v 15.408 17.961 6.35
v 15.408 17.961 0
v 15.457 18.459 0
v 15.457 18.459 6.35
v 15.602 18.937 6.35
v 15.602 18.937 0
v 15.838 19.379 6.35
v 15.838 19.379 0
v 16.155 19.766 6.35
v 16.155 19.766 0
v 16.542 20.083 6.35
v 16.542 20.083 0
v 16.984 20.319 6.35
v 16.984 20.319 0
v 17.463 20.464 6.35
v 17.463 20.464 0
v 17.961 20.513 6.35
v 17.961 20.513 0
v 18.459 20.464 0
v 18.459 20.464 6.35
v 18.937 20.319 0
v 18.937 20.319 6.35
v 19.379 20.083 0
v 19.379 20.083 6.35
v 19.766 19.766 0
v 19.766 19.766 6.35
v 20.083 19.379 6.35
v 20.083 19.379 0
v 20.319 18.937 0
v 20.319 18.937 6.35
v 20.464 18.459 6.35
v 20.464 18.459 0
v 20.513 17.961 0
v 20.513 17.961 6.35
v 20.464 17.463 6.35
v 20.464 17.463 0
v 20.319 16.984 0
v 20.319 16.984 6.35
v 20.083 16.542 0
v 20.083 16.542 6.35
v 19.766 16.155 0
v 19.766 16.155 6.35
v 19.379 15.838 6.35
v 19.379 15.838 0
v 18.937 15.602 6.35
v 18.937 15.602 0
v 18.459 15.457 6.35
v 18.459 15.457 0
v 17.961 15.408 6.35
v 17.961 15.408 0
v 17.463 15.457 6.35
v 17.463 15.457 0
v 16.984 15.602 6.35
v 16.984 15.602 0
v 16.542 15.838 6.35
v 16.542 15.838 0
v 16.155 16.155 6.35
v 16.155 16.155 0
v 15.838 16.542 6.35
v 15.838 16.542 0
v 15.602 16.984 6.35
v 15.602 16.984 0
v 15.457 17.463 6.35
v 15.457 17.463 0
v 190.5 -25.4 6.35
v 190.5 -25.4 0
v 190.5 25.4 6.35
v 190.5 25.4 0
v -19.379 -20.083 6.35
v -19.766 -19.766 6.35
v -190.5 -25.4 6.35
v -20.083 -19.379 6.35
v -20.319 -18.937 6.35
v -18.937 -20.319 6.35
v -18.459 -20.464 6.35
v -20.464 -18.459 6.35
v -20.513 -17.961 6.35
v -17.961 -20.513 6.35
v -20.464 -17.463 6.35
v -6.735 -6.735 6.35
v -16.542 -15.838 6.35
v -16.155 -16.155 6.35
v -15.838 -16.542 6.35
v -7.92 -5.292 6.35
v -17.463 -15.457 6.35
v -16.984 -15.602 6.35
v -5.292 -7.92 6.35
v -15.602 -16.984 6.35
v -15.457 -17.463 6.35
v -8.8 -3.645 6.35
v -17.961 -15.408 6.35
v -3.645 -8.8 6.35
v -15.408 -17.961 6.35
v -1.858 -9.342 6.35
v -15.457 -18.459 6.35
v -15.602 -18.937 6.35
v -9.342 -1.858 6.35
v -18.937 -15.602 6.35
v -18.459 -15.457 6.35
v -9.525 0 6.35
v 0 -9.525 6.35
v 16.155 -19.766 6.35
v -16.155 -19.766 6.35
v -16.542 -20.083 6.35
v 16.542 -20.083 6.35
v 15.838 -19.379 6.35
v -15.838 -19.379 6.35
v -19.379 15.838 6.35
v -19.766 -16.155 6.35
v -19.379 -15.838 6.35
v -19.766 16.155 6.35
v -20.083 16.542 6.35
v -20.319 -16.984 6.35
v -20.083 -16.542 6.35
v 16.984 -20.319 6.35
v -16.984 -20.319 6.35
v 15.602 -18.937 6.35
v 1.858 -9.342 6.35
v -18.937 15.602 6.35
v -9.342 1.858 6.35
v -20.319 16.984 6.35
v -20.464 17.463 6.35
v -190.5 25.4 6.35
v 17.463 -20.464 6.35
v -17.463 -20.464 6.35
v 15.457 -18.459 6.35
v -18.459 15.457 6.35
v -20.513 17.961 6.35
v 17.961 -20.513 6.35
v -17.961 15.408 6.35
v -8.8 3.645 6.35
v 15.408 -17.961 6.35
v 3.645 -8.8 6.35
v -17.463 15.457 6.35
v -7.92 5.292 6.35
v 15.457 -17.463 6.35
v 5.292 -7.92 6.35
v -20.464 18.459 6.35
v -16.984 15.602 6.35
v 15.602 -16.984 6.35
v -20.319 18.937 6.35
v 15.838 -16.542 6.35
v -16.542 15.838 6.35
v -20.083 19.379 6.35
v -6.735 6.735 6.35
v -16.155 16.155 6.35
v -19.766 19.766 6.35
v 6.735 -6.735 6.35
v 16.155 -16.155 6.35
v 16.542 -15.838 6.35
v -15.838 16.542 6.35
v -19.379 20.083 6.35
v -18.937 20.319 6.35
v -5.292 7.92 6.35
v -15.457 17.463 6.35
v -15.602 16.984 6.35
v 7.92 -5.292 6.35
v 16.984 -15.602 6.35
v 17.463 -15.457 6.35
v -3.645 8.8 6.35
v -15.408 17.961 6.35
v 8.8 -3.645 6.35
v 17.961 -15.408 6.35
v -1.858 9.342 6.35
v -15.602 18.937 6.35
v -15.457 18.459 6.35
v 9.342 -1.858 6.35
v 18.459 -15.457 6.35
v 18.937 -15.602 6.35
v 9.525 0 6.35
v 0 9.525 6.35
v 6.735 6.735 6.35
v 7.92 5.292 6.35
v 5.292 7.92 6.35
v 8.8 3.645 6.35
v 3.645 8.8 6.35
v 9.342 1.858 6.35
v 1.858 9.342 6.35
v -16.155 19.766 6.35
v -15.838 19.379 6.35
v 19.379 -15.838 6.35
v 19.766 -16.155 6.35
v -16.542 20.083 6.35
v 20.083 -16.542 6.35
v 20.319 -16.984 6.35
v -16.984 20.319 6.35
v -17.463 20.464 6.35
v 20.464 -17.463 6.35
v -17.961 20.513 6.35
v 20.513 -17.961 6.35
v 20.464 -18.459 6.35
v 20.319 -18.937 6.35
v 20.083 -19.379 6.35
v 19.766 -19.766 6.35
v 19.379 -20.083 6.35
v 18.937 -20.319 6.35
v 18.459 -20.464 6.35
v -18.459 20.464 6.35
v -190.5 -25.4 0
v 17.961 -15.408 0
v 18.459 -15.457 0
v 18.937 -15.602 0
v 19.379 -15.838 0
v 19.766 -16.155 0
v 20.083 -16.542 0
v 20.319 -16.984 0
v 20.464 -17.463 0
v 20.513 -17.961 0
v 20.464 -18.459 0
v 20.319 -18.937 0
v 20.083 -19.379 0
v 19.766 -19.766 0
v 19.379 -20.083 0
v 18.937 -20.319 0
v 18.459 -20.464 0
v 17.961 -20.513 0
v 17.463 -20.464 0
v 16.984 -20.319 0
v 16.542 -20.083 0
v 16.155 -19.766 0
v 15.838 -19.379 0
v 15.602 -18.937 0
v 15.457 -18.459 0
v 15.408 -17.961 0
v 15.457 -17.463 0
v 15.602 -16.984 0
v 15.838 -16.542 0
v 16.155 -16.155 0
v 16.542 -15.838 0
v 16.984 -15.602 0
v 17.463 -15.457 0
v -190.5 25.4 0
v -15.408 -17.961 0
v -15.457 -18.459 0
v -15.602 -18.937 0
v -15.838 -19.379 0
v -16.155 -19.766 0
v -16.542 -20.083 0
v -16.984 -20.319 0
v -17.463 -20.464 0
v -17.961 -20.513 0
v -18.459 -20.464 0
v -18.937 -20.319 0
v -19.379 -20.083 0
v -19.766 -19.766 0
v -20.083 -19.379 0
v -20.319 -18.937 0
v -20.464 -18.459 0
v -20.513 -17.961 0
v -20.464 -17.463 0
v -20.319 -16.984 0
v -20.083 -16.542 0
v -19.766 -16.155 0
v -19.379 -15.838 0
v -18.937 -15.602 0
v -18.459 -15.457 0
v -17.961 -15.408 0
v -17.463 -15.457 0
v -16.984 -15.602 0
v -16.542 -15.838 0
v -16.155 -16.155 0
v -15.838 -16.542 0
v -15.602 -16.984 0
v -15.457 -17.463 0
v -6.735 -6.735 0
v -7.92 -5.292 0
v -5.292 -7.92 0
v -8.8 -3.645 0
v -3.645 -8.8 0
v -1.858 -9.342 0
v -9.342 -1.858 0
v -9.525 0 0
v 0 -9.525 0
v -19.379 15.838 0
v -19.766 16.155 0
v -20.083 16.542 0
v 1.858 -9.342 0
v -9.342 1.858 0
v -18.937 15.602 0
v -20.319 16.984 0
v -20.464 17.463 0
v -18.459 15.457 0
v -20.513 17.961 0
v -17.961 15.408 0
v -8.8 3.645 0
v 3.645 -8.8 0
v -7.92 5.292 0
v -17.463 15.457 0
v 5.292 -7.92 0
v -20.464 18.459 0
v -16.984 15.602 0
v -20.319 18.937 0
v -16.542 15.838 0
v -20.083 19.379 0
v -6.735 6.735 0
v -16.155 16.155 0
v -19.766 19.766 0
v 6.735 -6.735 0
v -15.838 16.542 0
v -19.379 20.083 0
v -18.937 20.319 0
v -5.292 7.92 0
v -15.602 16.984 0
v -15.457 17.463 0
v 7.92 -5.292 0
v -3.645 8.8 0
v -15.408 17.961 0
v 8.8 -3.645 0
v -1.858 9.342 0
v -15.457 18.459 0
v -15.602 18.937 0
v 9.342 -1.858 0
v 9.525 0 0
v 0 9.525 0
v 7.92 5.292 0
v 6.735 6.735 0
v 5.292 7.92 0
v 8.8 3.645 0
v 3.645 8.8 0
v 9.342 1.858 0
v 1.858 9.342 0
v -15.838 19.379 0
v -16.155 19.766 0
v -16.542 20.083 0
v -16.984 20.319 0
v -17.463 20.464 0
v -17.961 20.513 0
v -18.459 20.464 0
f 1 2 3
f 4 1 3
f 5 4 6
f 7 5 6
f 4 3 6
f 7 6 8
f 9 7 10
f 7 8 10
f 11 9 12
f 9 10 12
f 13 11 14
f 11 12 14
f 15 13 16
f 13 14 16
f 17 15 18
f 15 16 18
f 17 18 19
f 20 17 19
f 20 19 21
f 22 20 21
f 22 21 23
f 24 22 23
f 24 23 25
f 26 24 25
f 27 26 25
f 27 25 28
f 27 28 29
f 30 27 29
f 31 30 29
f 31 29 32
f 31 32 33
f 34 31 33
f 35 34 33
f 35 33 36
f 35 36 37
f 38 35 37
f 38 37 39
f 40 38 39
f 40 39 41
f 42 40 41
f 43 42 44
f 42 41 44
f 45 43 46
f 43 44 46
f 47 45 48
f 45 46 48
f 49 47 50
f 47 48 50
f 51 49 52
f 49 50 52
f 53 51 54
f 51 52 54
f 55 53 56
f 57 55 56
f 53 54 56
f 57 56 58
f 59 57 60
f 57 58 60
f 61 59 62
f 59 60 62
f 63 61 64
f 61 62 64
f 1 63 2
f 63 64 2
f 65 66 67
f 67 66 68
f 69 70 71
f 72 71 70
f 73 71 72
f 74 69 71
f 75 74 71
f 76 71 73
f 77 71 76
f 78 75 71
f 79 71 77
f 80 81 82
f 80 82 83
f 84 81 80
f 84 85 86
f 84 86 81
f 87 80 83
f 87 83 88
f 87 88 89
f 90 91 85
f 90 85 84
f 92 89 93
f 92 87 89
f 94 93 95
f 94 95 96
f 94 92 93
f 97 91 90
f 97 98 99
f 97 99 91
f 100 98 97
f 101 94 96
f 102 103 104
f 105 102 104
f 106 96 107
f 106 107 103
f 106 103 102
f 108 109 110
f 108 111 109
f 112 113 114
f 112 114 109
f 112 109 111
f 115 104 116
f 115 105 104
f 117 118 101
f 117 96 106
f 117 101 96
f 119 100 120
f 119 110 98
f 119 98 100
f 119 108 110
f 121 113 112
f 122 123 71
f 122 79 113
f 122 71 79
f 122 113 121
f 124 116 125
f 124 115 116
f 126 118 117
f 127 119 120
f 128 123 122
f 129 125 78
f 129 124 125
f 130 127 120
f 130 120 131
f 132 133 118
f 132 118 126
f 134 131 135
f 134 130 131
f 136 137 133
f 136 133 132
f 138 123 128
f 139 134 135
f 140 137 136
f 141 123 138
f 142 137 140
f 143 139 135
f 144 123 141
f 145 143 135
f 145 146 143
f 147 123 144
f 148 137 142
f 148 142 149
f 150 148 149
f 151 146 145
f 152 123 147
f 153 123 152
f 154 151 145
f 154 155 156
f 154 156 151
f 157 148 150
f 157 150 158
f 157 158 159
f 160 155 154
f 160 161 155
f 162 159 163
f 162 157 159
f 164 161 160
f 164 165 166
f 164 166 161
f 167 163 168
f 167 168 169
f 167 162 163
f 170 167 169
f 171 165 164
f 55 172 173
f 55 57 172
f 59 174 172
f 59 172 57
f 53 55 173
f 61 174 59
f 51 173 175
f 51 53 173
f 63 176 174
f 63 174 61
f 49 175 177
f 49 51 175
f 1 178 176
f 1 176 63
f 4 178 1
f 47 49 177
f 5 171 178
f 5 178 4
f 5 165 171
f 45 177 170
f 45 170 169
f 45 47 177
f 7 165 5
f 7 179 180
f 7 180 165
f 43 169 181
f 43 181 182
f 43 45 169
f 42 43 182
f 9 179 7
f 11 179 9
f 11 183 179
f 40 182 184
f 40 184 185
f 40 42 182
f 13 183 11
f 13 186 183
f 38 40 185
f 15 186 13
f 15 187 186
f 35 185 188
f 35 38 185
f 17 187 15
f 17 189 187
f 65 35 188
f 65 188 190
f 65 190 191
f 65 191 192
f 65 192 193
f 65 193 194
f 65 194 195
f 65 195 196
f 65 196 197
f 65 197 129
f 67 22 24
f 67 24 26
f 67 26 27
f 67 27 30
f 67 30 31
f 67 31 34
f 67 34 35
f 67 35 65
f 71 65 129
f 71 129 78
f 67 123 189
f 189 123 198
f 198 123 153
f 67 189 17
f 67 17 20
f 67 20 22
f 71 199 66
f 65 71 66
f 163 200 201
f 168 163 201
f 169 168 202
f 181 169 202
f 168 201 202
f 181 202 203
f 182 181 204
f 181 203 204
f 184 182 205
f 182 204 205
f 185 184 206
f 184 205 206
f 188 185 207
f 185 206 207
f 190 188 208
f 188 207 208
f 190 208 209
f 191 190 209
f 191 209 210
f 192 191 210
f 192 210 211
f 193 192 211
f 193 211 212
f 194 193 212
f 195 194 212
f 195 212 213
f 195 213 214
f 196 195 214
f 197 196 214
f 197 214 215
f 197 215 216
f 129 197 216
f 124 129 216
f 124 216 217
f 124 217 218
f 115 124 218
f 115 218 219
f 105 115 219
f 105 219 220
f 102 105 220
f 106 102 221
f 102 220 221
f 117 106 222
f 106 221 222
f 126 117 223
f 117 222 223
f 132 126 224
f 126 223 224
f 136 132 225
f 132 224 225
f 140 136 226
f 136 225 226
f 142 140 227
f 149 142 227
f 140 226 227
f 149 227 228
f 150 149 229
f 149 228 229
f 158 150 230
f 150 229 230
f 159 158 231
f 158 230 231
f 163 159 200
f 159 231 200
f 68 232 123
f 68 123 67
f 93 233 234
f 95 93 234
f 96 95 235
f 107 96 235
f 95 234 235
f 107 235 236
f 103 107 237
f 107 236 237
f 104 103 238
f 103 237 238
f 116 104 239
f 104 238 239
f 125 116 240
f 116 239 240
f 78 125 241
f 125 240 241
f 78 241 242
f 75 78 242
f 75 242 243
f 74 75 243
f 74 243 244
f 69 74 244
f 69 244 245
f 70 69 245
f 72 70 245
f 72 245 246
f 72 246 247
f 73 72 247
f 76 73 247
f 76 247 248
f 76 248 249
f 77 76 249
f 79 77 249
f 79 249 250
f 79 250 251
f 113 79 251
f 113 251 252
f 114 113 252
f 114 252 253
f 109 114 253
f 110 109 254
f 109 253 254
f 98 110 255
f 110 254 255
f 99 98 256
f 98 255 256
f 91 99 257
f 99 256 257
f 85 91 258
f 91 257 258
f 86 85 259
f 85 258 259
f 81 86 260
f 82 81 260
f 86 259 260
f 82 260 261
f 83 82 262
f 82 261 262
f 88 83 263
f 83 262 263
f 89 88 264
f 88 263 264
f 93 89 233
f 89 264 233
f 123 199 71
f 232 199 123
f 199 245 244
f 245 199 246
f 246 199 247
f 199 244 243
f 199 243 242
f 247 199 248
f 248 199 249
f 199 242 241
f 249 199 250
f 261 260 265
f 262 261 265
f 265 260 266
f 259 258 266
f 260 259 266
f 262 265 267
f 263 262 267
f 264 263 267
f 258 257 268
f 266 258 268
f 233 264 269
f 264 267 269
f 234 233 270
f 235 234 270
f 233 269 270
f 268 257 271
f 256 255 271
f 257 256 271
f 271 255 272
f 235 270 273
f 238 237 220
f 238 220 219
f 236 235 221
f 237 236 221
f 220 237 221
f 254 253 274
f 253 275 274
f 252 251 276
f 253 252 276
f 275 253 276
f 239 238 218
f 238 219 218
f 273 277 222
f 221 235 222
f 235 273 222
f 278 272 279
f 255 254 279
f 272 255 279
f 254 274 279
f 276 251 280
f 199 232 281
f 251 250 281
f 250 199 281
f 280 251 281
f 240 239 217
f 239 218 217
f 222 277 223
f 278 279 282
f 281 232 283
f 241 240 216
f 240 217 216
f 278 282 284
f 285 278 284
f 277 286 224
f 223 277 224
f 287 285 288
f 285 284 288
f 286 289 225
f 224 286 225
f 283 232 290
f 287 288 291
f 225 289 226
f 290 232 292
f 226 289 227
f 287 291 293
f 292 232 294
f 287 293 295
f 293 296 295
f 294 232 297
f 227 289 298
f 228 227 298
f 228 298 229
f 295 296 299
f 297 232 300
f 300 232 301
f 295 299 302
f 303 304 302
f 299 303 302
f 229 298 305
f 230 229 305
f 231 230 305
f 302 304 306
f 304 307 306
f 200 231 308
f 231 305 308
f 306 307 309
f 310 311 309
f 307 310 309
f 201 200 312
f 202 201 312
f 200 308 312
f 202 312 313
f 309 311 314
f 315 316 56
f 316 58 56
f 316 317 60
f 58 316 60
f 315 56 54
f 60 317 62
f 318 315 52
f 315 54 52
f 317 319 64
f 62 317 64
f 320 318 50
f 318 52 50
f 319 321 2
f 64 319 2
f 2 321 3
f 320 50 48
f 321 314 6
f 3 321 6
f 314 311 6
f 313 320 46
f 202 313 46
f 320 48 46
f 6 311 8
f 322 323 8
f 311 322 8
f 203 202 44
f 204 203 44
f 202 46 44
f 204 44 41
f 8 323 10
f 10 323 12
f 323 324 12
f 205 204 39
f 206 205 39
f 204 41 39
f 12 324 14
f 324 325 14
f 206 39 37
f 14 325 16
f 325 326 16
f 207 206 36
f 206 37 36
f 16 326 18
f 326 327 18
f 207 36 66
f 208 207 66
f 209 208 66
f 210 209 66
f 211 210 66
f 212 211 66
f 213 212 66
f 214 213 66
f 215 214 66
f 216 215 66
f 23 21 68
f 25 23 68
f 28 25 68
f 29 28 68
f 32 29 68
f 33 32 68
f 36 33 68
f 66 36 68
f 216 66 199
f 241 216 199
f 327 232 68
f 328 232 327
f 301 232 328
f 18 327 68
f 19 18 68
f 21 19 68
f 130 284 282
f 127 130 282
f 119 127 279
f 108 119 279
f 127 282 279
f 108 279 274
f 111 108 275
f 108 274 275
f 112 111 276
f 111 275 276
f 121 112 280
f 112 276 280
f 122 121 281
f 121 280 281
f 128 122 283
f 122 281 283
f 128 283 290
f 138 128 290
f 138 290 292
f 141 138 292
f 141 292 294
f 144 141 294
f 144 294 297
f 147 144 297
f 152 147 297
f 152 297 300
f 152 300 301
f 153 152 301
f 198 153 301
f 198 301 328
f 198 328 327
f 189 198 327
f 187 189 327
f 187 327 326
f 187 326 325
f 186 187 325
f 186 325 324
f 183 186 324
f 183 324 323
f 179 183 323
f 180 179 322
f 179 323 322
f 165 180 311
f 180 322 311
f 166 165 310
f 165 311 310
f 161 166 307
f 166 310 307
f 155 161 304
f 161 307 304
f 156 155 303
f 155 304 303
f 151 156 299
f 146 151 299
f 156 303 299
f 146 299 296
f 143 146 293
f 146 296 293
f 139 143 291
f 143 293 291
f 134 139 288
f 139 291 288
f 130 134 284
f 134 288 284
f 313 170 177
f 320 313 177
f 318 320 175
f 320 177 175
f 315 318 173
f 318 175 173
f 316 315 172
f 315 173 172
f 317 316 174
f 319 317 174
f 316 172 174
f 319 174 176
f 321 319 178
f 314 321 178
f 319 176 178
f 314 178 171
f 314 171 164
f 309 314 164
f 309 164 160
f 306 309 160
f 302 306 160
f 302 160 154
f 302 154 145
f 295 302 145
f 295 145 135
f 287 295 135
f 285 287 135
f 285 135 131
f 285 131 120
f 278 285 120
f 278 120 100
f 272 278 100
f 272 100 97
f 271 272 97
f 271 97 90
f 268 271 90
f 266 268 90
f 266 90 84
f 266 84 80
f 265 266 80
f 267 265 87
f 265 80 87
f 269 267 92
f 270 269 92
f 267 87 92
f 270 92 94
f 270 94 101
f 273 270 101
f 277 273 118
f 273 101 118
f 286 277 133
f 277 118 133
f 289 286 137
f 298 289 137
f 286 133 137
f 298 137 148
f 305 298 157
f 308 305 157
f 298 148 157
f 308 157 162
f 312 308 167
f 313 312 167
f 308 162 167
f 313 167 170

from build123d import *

# Parameters (mm, degrees)
SKETCH1_W                  = 381
SKETCH1_H                  = 50.8
BOSS_EXTRUDE1_DEPTH        = 6.35
SKETCH2_R                  = 9.525
CUT_EXTRUDE1_DEPTH         = 193.290749908
F_7_0_201_DIAMETER_HOLE1_D = 5.1054
CIRPATTERN1_COUNT          = 4


with BuildPart() as part:
    # Sketch1 → Boss-Extrude1 (new body)
    with BuildSketch(Plane.XY):
        Rectangle(SKETCH1_W, SKETCH1_H)
    extrude(amount=BOSS_EXTRUDE1_DEPTH)

    # Sketch2 → Cut-Extrude1 (cut, through all)
    with BuildSketch(Plane.XY.offset(6.35)):
        Circle(SKETCH2_R)
    extrude(amount=-CUT_EXTRUDE1_DEPTH, mode=Mode.SUBTRACT)

    # #7 (0.201) Diameter Hole1 (through all)
    with Locations(Plane.XY.offset(6.35)):
        with Locations((17.960512242, 17.960512242)):
            f_7_0_201_diameter_hole1 = Hole(F_7_0_201_DIAMETER_HOLE1_D / 2)

    # CirPattern1: #7 (0.201) Diameter Hole1 ×4 about axis
    cirpattern1_axis = Axis((0, 0, 0), (0, 0, 1))
    for i in range(1, CIRPATTERN1_COUNT):
        add(f_7_0_201_diameter_hole1.rotate(cirpattern1_axis, i * 360 / CIRPATTERN1_COUNT), mode=Mode.SUBTRACT)


solid = part.part
